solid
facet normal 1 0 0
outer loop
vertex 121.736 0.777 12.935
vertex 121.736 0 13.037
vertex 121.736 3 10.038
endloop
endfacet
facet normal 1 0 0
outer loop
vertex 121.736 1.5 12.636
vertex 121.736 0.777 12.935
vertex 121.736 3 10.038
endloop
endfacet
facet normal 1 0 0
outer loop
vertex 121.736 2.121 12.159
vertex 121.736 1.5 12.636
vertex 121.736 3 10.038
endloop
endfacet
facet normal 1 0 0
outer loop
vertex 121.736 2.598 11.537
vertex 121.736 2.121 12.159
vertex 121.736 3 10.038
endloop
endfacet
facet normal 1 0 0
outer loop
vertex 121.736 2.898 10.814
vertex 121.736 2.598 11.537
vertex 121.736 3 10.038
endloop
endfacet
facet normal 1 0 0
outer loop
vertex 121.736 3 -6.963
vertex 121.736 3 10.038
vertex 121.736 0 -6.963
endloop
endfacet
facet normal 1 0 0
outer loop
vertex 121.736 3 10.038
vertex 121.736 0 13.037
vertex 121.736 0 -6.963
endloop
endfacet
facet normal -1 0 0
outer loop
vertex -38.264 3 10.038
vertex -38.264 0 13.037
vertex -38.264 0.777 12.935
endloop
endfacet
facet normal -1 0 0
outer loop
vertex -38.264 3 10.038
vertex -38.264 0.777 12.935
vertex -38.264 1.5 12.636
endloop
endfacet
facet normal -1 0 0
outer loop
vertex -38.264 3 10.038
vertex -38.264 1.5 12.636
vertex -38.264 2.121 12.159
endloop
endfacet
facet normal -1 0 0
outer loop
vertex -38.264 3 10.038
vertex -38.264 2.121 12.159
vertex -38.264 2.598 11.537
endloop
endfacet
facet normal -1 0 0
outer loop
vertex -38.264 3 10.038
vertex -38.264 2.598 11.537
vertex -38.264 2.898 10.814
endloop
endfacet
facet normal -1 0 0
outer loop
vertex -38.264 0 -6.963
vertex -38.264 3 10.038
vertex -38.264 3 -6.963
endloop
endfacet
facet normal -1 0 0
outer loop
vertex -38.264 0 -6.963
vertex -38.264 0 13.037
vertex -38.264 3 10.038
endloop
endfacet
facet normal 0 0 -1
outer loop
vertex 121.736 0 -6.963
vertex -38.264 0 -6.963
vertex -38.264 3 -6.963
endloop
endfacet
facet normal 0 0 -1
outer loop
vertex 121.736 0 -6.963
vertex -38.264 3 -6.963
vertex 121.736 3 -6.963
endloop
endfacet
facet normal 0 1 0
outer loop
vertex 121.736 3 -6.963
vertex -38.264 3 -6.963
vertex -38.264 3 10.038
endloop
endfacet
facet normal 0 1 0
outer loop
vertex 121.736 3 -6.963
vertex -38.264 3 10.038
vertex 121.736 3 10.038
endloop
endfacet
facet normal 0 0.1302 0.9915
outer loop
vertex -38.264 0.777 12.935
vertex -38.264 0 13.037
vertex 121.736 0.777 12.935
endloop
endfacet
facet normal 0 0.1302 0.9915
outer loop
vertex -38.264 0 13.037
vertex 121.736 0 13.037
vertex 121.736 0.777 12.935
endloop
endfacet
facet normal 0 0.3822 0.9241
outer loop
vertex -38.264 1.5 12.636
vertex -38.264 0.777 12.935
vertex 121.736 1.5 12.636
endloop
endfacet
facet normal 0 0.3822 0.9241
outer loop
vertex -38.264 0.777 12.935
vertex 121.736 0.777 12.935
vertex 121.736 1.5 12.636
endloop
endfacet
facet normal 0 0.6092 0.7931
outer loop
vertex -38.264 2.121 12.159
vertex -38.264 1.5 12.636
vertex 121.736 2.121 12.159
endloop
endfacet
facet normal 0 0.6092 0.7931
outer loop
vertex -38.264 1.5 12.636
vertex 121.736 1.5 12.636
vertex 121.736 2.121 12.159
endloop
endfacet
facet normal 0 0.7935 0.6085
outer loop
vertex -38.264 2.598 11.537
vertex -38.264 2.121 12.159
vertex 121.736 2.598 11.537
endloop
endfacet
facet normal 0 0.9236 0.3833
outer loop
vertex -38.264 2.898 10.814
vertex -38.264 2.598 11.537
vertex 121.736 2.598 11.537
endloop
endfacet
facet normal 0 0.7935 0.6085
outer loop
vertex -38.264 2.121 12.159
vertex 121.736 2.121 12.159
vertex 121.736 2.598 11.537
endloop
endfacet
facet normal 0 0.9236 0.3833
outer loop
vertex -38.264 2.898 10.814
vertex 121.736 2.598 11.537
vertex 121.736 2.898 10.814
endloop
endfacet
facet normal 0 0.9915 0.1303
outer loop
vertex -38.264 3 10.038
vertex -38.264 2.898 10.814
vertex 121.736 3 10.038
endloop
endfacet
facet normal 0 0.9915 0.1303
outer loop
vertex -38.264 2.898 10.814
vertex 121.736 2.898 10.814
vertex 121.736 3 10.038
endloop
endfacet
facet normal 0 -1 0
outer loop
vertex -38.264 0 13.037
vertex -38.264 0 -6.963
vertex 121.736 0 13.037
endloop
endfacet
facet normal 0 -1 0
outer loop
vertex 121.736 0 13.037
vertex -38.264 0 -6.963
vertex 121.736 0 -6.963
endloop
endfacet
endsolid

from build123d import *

# Parameters (mm, degrees)
ESBO_O1_W                = 160
ESBO_O1_H                = 20
RESSALTO_EXTRUS_O1_DEPTH = 3
FILETE2_R                = 3


with BuildPart() as part:
    # Esboço1 → Ressalto-extrusão1 (new body)
    with BuildSketch(Plane(origin=(0, 0, 0), x_dir=(1, 0, 0), z_dir=(0, 1, 0))):
        with Locations((41.735785703, -3.037439614)):
            Rectangle(ESBO_O1_W, ESBO_O1_H)
    extrude(amount=RESSALTO_EXTRUS_O1_DEPTH)

    # Filete2
    filete2_edges = [part.edges().sort_by_distance(p)[0] for p in [
        (41.735785703, 3, 13.037439614),
    ]]
    fillet(filete2_edges, radius=FILETE2_R - 0.0001)  # a hair under: the kernel refuses the full size


solid = part.part
